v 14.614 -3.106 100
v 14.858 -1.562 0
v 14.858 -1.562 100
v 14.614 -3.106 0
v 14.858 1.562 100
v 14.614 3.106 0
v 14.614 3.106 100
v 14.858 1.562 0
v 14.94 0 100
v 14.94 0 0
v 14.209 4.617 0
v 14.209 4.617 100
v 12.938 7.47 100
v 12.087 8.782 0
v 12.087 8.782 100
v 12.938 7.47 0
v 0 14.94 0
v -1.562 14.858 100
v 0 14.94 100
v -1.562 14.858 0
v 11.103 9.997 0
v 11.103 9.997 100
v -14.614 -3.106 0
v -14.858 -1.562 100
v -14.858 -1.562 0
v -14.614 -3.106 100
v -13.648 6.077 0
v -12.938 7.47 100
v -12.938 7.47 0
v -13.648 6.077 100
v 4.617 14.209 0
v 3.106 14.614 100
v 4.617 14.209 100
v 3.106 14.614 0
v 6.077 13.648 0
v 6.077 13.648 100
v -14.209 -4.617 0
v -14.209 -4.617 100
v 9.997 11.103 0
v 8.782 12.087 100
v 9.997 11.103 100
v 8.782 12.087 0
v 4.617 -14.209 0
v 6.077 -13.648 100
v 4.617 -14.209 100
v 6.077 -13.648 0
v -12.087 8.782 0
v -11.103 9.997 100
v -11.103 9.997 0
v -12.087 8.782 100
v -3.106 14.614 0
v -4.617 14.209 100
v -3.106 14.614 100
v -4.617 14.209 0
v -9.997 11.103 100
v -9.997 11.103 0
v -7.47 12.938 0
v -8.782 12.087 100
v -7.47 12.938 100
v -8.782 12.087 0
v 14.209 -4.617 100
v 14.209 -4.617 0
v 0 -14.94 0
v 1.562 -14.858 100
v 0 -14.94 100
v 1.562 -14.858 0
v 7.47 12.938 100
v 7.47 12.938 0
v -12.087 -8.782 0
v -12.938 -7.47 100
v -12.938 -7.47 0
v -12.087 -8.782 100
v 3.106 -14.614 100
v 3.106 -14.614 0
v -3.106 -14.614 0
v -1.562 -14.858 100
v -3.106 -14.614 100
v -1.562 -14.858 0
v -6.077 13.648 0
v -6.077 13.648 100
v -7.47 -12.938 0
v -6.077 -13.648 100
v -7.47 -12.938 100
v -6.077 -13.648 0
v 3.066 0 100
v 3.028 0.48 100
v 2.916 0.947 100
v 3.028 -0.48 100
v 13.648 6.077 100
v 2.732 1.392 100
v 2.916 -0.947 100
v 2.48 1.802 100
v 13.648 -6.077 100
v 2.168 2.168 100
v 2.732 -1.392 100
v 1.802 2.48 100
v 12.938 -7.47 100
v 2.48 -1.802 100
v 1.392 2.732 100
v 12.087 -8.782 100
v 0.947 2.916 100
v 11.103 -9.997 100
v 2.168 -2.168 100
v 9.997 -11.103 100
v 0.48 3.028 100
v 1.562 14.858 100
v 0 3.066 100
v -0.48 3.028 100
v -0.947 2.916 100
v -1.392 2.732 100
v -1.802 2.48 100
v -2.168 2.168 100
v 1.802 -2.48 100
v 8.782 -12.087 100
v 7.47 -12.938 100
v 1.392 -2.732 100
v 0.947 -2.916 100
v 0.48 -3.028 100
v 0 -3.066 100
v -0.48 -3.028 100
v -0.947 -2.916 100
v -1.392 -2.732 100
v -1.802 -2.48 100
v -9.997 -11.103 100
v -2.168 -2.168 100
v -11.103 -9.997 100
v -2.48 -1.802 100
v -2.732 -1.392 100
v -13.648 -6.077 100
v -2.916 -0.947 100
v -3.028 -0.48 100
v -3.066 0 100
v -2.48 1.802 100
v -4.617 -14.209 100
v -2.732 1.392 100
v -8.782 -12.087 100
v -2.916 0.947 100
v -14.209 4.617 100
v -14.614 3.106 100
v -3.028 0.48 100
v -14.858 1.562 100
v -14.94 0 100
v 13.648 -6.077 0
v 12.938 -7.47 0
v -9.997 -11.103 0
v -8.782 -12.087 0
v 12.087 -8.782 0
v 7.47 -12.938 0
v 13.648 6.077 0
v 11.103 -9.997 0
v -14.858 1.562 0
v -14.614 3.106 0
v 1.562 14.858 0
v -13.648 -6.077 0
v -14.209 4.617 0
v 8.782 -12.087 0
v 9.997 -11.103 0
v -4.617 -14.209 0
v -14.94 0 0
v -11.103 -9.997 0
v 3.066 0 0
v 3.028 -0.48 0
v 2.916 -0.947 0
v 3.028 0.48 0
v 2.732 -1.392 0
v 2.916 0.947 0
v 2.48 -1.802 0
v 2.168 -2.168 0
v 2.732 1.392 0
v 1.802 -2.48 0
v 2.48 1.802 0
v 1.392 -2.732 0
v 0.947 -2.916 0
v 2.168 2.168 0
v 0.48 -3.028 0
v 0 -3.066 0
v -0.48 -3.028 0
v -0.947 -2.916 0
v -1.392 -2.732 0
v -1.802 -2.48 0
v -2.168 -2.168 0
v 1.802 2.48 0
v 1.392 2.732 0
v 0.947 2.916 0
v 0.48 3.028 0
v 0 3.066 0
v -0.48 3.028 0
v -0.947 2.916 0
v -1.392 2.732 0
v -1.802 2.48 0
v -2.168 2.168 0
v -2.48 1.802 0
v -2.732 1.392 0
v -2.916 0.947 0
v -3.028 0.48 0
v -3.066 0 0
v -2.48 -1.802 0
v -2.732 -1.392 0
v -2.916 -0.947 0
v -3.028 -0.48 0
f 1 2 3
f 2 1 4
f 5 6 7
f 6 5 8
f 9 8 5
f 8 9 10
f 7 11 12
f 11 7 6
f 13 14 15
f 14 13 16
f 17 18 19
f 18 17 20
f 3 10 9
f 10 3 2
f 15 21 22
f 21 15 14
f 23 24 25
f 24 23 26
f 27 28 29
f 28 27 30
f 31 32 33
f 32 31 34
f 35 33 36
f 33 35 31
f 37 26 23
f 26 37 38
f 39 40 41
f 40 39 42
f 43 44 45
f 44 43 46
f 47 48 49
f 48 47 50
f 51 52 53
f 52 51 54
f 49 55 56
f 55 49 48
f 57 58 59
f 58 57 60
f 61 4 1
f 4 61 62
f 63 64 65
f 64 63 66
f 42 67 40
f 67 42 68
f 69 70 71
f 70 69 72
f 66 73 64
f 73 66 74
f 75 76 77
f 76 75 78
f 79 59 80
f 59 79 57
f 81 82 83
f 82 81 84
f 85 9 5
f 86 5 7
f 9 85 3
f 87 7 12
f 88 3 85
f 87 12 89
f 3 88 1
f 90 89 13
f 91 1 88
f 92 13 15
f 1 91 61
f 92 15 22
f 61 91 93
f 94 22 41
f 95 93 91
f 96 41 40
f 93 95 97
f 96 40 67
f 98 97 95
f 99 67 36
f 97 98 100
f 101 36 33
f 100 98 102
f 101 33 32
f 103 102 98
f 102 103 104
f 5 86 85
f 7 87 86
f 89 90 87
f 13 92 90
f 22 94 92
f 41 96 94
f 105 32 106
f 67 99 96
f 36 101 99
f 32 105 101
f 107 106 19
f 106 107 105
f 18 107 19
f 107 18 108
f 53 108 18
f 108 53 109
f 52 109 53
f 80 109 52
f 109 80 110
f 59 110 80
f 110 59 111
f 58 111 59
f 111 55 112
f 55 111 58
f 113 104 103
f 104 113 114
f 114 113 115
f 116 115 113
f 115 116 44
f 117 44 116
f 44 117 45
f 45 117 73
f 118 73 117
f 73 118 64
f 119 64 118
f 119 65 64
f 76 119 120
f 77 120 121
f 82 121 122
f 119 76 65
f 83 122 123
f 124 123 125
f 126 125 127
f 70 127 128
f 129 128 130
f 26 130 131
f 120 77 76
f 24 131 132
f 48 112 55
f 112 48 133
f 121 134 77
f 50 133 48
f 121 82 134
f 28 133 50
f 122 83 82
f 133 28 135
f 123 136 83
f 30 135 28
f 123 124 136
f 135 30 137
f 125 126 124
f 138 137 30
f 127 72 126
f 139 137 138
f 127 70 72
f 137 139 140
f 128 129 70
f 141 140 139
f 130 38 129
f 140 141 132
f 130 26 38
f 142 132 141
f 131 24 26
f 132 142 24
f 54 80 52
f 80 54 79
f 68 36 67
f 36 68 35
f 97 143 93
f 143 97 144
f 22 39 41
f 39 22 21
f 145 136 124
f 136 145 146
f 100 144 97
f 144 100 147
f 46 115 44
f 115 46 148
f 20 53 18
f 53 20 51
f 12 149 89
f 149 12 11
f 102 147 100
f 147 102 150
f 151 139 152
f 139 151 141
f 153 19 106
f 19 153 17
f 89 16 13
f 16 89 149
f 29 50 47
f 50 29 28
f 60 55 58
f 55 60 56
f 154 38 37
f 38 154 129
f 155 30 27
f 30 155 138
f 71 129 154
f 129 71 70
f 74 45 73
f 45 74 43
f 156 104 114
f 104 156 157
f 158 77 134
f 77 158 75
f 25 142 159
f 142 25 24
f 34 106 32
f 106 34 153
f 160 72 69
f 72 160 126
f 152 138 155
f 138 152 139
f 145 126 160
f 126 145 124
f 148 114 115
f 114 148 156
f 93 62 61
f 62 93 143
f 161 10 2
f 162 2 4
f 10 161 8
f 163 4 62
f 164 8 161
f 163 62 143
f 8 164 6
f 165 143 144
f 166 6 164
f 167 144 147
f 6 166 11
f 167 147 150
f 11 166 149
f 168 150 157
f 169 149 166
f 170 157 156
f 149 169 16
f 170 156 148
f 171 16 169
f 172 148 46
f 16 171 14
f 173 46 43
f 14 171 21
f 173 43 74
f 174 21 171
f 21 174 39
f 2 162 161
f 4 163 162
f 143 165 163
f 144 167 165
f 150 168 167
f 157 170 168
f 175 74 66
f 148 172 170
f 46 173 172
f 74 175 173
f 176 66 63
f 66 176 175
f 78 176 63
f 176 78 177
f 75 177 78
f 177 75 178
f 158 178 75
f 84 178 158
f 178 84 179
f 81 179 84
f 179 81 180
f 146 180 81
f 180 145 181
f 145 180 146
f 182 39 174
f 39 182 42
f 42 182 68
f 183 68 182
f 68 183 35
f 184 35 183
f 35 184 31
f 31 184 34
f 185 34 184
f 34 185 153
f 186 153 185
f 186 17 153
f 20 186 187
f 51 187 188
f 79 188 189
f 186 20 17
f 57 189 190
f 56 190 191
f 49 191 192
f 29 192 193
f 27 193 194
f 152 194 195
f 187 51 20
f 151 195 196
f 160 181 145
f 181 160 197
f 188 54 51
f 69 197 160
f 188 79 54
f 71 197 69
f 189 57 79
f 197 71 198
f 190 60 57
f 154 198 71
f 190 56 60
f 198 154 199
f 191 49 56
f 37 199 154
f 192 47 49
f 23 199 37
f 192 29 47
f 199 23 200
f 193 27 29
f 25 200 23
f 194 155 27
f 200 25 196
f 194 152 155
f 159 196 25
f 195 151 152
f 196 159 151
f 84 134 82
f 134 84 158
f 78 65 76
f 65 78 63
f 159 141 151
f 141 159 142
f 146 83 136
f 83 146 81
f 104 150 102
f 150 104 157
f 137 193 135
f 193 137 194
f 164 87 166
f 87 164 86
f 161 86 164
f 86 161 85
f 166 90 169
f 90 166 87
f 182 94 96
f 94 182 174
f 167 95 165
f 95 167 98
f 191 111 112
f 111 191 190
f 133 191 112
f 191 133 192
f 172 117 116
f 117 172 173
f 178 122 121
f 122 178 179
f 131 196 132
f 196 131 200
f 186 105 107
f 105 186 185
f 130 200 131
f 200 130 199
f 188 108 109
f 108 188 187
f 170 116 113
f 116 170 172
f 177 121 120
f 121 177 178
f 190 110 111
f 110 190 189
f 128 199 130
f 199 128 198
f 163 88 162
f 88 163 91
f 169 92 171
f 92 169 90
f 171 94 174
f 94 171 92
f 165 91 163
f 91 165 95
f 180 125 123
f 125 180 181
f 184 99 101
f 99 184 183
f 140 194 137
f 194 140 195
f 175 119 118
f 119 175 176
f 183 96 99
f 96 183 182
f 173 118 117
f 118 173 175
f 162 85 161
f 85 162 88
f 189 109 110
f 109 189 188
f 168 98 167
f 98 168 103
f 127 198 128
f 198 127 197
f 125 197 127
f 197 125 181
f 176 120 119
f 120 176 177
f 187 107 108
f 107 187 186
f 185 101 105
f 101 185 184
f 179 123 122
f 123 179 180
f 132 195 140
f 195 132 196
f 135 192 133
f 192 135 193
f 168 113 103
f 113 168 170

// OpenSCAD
        wall_thickness = 2.83;
        bore_clearance = 1.066;
        roller_radius = 14.94;

        module roller() {
            difference() {
                cylinder(h=100, r=roller_radius, $fn=60);
                translate([0,0,-5])
                    cylinder(h=110, r=bore_clearance + 2, $fn=40);
            }
        }
        roller();
        
